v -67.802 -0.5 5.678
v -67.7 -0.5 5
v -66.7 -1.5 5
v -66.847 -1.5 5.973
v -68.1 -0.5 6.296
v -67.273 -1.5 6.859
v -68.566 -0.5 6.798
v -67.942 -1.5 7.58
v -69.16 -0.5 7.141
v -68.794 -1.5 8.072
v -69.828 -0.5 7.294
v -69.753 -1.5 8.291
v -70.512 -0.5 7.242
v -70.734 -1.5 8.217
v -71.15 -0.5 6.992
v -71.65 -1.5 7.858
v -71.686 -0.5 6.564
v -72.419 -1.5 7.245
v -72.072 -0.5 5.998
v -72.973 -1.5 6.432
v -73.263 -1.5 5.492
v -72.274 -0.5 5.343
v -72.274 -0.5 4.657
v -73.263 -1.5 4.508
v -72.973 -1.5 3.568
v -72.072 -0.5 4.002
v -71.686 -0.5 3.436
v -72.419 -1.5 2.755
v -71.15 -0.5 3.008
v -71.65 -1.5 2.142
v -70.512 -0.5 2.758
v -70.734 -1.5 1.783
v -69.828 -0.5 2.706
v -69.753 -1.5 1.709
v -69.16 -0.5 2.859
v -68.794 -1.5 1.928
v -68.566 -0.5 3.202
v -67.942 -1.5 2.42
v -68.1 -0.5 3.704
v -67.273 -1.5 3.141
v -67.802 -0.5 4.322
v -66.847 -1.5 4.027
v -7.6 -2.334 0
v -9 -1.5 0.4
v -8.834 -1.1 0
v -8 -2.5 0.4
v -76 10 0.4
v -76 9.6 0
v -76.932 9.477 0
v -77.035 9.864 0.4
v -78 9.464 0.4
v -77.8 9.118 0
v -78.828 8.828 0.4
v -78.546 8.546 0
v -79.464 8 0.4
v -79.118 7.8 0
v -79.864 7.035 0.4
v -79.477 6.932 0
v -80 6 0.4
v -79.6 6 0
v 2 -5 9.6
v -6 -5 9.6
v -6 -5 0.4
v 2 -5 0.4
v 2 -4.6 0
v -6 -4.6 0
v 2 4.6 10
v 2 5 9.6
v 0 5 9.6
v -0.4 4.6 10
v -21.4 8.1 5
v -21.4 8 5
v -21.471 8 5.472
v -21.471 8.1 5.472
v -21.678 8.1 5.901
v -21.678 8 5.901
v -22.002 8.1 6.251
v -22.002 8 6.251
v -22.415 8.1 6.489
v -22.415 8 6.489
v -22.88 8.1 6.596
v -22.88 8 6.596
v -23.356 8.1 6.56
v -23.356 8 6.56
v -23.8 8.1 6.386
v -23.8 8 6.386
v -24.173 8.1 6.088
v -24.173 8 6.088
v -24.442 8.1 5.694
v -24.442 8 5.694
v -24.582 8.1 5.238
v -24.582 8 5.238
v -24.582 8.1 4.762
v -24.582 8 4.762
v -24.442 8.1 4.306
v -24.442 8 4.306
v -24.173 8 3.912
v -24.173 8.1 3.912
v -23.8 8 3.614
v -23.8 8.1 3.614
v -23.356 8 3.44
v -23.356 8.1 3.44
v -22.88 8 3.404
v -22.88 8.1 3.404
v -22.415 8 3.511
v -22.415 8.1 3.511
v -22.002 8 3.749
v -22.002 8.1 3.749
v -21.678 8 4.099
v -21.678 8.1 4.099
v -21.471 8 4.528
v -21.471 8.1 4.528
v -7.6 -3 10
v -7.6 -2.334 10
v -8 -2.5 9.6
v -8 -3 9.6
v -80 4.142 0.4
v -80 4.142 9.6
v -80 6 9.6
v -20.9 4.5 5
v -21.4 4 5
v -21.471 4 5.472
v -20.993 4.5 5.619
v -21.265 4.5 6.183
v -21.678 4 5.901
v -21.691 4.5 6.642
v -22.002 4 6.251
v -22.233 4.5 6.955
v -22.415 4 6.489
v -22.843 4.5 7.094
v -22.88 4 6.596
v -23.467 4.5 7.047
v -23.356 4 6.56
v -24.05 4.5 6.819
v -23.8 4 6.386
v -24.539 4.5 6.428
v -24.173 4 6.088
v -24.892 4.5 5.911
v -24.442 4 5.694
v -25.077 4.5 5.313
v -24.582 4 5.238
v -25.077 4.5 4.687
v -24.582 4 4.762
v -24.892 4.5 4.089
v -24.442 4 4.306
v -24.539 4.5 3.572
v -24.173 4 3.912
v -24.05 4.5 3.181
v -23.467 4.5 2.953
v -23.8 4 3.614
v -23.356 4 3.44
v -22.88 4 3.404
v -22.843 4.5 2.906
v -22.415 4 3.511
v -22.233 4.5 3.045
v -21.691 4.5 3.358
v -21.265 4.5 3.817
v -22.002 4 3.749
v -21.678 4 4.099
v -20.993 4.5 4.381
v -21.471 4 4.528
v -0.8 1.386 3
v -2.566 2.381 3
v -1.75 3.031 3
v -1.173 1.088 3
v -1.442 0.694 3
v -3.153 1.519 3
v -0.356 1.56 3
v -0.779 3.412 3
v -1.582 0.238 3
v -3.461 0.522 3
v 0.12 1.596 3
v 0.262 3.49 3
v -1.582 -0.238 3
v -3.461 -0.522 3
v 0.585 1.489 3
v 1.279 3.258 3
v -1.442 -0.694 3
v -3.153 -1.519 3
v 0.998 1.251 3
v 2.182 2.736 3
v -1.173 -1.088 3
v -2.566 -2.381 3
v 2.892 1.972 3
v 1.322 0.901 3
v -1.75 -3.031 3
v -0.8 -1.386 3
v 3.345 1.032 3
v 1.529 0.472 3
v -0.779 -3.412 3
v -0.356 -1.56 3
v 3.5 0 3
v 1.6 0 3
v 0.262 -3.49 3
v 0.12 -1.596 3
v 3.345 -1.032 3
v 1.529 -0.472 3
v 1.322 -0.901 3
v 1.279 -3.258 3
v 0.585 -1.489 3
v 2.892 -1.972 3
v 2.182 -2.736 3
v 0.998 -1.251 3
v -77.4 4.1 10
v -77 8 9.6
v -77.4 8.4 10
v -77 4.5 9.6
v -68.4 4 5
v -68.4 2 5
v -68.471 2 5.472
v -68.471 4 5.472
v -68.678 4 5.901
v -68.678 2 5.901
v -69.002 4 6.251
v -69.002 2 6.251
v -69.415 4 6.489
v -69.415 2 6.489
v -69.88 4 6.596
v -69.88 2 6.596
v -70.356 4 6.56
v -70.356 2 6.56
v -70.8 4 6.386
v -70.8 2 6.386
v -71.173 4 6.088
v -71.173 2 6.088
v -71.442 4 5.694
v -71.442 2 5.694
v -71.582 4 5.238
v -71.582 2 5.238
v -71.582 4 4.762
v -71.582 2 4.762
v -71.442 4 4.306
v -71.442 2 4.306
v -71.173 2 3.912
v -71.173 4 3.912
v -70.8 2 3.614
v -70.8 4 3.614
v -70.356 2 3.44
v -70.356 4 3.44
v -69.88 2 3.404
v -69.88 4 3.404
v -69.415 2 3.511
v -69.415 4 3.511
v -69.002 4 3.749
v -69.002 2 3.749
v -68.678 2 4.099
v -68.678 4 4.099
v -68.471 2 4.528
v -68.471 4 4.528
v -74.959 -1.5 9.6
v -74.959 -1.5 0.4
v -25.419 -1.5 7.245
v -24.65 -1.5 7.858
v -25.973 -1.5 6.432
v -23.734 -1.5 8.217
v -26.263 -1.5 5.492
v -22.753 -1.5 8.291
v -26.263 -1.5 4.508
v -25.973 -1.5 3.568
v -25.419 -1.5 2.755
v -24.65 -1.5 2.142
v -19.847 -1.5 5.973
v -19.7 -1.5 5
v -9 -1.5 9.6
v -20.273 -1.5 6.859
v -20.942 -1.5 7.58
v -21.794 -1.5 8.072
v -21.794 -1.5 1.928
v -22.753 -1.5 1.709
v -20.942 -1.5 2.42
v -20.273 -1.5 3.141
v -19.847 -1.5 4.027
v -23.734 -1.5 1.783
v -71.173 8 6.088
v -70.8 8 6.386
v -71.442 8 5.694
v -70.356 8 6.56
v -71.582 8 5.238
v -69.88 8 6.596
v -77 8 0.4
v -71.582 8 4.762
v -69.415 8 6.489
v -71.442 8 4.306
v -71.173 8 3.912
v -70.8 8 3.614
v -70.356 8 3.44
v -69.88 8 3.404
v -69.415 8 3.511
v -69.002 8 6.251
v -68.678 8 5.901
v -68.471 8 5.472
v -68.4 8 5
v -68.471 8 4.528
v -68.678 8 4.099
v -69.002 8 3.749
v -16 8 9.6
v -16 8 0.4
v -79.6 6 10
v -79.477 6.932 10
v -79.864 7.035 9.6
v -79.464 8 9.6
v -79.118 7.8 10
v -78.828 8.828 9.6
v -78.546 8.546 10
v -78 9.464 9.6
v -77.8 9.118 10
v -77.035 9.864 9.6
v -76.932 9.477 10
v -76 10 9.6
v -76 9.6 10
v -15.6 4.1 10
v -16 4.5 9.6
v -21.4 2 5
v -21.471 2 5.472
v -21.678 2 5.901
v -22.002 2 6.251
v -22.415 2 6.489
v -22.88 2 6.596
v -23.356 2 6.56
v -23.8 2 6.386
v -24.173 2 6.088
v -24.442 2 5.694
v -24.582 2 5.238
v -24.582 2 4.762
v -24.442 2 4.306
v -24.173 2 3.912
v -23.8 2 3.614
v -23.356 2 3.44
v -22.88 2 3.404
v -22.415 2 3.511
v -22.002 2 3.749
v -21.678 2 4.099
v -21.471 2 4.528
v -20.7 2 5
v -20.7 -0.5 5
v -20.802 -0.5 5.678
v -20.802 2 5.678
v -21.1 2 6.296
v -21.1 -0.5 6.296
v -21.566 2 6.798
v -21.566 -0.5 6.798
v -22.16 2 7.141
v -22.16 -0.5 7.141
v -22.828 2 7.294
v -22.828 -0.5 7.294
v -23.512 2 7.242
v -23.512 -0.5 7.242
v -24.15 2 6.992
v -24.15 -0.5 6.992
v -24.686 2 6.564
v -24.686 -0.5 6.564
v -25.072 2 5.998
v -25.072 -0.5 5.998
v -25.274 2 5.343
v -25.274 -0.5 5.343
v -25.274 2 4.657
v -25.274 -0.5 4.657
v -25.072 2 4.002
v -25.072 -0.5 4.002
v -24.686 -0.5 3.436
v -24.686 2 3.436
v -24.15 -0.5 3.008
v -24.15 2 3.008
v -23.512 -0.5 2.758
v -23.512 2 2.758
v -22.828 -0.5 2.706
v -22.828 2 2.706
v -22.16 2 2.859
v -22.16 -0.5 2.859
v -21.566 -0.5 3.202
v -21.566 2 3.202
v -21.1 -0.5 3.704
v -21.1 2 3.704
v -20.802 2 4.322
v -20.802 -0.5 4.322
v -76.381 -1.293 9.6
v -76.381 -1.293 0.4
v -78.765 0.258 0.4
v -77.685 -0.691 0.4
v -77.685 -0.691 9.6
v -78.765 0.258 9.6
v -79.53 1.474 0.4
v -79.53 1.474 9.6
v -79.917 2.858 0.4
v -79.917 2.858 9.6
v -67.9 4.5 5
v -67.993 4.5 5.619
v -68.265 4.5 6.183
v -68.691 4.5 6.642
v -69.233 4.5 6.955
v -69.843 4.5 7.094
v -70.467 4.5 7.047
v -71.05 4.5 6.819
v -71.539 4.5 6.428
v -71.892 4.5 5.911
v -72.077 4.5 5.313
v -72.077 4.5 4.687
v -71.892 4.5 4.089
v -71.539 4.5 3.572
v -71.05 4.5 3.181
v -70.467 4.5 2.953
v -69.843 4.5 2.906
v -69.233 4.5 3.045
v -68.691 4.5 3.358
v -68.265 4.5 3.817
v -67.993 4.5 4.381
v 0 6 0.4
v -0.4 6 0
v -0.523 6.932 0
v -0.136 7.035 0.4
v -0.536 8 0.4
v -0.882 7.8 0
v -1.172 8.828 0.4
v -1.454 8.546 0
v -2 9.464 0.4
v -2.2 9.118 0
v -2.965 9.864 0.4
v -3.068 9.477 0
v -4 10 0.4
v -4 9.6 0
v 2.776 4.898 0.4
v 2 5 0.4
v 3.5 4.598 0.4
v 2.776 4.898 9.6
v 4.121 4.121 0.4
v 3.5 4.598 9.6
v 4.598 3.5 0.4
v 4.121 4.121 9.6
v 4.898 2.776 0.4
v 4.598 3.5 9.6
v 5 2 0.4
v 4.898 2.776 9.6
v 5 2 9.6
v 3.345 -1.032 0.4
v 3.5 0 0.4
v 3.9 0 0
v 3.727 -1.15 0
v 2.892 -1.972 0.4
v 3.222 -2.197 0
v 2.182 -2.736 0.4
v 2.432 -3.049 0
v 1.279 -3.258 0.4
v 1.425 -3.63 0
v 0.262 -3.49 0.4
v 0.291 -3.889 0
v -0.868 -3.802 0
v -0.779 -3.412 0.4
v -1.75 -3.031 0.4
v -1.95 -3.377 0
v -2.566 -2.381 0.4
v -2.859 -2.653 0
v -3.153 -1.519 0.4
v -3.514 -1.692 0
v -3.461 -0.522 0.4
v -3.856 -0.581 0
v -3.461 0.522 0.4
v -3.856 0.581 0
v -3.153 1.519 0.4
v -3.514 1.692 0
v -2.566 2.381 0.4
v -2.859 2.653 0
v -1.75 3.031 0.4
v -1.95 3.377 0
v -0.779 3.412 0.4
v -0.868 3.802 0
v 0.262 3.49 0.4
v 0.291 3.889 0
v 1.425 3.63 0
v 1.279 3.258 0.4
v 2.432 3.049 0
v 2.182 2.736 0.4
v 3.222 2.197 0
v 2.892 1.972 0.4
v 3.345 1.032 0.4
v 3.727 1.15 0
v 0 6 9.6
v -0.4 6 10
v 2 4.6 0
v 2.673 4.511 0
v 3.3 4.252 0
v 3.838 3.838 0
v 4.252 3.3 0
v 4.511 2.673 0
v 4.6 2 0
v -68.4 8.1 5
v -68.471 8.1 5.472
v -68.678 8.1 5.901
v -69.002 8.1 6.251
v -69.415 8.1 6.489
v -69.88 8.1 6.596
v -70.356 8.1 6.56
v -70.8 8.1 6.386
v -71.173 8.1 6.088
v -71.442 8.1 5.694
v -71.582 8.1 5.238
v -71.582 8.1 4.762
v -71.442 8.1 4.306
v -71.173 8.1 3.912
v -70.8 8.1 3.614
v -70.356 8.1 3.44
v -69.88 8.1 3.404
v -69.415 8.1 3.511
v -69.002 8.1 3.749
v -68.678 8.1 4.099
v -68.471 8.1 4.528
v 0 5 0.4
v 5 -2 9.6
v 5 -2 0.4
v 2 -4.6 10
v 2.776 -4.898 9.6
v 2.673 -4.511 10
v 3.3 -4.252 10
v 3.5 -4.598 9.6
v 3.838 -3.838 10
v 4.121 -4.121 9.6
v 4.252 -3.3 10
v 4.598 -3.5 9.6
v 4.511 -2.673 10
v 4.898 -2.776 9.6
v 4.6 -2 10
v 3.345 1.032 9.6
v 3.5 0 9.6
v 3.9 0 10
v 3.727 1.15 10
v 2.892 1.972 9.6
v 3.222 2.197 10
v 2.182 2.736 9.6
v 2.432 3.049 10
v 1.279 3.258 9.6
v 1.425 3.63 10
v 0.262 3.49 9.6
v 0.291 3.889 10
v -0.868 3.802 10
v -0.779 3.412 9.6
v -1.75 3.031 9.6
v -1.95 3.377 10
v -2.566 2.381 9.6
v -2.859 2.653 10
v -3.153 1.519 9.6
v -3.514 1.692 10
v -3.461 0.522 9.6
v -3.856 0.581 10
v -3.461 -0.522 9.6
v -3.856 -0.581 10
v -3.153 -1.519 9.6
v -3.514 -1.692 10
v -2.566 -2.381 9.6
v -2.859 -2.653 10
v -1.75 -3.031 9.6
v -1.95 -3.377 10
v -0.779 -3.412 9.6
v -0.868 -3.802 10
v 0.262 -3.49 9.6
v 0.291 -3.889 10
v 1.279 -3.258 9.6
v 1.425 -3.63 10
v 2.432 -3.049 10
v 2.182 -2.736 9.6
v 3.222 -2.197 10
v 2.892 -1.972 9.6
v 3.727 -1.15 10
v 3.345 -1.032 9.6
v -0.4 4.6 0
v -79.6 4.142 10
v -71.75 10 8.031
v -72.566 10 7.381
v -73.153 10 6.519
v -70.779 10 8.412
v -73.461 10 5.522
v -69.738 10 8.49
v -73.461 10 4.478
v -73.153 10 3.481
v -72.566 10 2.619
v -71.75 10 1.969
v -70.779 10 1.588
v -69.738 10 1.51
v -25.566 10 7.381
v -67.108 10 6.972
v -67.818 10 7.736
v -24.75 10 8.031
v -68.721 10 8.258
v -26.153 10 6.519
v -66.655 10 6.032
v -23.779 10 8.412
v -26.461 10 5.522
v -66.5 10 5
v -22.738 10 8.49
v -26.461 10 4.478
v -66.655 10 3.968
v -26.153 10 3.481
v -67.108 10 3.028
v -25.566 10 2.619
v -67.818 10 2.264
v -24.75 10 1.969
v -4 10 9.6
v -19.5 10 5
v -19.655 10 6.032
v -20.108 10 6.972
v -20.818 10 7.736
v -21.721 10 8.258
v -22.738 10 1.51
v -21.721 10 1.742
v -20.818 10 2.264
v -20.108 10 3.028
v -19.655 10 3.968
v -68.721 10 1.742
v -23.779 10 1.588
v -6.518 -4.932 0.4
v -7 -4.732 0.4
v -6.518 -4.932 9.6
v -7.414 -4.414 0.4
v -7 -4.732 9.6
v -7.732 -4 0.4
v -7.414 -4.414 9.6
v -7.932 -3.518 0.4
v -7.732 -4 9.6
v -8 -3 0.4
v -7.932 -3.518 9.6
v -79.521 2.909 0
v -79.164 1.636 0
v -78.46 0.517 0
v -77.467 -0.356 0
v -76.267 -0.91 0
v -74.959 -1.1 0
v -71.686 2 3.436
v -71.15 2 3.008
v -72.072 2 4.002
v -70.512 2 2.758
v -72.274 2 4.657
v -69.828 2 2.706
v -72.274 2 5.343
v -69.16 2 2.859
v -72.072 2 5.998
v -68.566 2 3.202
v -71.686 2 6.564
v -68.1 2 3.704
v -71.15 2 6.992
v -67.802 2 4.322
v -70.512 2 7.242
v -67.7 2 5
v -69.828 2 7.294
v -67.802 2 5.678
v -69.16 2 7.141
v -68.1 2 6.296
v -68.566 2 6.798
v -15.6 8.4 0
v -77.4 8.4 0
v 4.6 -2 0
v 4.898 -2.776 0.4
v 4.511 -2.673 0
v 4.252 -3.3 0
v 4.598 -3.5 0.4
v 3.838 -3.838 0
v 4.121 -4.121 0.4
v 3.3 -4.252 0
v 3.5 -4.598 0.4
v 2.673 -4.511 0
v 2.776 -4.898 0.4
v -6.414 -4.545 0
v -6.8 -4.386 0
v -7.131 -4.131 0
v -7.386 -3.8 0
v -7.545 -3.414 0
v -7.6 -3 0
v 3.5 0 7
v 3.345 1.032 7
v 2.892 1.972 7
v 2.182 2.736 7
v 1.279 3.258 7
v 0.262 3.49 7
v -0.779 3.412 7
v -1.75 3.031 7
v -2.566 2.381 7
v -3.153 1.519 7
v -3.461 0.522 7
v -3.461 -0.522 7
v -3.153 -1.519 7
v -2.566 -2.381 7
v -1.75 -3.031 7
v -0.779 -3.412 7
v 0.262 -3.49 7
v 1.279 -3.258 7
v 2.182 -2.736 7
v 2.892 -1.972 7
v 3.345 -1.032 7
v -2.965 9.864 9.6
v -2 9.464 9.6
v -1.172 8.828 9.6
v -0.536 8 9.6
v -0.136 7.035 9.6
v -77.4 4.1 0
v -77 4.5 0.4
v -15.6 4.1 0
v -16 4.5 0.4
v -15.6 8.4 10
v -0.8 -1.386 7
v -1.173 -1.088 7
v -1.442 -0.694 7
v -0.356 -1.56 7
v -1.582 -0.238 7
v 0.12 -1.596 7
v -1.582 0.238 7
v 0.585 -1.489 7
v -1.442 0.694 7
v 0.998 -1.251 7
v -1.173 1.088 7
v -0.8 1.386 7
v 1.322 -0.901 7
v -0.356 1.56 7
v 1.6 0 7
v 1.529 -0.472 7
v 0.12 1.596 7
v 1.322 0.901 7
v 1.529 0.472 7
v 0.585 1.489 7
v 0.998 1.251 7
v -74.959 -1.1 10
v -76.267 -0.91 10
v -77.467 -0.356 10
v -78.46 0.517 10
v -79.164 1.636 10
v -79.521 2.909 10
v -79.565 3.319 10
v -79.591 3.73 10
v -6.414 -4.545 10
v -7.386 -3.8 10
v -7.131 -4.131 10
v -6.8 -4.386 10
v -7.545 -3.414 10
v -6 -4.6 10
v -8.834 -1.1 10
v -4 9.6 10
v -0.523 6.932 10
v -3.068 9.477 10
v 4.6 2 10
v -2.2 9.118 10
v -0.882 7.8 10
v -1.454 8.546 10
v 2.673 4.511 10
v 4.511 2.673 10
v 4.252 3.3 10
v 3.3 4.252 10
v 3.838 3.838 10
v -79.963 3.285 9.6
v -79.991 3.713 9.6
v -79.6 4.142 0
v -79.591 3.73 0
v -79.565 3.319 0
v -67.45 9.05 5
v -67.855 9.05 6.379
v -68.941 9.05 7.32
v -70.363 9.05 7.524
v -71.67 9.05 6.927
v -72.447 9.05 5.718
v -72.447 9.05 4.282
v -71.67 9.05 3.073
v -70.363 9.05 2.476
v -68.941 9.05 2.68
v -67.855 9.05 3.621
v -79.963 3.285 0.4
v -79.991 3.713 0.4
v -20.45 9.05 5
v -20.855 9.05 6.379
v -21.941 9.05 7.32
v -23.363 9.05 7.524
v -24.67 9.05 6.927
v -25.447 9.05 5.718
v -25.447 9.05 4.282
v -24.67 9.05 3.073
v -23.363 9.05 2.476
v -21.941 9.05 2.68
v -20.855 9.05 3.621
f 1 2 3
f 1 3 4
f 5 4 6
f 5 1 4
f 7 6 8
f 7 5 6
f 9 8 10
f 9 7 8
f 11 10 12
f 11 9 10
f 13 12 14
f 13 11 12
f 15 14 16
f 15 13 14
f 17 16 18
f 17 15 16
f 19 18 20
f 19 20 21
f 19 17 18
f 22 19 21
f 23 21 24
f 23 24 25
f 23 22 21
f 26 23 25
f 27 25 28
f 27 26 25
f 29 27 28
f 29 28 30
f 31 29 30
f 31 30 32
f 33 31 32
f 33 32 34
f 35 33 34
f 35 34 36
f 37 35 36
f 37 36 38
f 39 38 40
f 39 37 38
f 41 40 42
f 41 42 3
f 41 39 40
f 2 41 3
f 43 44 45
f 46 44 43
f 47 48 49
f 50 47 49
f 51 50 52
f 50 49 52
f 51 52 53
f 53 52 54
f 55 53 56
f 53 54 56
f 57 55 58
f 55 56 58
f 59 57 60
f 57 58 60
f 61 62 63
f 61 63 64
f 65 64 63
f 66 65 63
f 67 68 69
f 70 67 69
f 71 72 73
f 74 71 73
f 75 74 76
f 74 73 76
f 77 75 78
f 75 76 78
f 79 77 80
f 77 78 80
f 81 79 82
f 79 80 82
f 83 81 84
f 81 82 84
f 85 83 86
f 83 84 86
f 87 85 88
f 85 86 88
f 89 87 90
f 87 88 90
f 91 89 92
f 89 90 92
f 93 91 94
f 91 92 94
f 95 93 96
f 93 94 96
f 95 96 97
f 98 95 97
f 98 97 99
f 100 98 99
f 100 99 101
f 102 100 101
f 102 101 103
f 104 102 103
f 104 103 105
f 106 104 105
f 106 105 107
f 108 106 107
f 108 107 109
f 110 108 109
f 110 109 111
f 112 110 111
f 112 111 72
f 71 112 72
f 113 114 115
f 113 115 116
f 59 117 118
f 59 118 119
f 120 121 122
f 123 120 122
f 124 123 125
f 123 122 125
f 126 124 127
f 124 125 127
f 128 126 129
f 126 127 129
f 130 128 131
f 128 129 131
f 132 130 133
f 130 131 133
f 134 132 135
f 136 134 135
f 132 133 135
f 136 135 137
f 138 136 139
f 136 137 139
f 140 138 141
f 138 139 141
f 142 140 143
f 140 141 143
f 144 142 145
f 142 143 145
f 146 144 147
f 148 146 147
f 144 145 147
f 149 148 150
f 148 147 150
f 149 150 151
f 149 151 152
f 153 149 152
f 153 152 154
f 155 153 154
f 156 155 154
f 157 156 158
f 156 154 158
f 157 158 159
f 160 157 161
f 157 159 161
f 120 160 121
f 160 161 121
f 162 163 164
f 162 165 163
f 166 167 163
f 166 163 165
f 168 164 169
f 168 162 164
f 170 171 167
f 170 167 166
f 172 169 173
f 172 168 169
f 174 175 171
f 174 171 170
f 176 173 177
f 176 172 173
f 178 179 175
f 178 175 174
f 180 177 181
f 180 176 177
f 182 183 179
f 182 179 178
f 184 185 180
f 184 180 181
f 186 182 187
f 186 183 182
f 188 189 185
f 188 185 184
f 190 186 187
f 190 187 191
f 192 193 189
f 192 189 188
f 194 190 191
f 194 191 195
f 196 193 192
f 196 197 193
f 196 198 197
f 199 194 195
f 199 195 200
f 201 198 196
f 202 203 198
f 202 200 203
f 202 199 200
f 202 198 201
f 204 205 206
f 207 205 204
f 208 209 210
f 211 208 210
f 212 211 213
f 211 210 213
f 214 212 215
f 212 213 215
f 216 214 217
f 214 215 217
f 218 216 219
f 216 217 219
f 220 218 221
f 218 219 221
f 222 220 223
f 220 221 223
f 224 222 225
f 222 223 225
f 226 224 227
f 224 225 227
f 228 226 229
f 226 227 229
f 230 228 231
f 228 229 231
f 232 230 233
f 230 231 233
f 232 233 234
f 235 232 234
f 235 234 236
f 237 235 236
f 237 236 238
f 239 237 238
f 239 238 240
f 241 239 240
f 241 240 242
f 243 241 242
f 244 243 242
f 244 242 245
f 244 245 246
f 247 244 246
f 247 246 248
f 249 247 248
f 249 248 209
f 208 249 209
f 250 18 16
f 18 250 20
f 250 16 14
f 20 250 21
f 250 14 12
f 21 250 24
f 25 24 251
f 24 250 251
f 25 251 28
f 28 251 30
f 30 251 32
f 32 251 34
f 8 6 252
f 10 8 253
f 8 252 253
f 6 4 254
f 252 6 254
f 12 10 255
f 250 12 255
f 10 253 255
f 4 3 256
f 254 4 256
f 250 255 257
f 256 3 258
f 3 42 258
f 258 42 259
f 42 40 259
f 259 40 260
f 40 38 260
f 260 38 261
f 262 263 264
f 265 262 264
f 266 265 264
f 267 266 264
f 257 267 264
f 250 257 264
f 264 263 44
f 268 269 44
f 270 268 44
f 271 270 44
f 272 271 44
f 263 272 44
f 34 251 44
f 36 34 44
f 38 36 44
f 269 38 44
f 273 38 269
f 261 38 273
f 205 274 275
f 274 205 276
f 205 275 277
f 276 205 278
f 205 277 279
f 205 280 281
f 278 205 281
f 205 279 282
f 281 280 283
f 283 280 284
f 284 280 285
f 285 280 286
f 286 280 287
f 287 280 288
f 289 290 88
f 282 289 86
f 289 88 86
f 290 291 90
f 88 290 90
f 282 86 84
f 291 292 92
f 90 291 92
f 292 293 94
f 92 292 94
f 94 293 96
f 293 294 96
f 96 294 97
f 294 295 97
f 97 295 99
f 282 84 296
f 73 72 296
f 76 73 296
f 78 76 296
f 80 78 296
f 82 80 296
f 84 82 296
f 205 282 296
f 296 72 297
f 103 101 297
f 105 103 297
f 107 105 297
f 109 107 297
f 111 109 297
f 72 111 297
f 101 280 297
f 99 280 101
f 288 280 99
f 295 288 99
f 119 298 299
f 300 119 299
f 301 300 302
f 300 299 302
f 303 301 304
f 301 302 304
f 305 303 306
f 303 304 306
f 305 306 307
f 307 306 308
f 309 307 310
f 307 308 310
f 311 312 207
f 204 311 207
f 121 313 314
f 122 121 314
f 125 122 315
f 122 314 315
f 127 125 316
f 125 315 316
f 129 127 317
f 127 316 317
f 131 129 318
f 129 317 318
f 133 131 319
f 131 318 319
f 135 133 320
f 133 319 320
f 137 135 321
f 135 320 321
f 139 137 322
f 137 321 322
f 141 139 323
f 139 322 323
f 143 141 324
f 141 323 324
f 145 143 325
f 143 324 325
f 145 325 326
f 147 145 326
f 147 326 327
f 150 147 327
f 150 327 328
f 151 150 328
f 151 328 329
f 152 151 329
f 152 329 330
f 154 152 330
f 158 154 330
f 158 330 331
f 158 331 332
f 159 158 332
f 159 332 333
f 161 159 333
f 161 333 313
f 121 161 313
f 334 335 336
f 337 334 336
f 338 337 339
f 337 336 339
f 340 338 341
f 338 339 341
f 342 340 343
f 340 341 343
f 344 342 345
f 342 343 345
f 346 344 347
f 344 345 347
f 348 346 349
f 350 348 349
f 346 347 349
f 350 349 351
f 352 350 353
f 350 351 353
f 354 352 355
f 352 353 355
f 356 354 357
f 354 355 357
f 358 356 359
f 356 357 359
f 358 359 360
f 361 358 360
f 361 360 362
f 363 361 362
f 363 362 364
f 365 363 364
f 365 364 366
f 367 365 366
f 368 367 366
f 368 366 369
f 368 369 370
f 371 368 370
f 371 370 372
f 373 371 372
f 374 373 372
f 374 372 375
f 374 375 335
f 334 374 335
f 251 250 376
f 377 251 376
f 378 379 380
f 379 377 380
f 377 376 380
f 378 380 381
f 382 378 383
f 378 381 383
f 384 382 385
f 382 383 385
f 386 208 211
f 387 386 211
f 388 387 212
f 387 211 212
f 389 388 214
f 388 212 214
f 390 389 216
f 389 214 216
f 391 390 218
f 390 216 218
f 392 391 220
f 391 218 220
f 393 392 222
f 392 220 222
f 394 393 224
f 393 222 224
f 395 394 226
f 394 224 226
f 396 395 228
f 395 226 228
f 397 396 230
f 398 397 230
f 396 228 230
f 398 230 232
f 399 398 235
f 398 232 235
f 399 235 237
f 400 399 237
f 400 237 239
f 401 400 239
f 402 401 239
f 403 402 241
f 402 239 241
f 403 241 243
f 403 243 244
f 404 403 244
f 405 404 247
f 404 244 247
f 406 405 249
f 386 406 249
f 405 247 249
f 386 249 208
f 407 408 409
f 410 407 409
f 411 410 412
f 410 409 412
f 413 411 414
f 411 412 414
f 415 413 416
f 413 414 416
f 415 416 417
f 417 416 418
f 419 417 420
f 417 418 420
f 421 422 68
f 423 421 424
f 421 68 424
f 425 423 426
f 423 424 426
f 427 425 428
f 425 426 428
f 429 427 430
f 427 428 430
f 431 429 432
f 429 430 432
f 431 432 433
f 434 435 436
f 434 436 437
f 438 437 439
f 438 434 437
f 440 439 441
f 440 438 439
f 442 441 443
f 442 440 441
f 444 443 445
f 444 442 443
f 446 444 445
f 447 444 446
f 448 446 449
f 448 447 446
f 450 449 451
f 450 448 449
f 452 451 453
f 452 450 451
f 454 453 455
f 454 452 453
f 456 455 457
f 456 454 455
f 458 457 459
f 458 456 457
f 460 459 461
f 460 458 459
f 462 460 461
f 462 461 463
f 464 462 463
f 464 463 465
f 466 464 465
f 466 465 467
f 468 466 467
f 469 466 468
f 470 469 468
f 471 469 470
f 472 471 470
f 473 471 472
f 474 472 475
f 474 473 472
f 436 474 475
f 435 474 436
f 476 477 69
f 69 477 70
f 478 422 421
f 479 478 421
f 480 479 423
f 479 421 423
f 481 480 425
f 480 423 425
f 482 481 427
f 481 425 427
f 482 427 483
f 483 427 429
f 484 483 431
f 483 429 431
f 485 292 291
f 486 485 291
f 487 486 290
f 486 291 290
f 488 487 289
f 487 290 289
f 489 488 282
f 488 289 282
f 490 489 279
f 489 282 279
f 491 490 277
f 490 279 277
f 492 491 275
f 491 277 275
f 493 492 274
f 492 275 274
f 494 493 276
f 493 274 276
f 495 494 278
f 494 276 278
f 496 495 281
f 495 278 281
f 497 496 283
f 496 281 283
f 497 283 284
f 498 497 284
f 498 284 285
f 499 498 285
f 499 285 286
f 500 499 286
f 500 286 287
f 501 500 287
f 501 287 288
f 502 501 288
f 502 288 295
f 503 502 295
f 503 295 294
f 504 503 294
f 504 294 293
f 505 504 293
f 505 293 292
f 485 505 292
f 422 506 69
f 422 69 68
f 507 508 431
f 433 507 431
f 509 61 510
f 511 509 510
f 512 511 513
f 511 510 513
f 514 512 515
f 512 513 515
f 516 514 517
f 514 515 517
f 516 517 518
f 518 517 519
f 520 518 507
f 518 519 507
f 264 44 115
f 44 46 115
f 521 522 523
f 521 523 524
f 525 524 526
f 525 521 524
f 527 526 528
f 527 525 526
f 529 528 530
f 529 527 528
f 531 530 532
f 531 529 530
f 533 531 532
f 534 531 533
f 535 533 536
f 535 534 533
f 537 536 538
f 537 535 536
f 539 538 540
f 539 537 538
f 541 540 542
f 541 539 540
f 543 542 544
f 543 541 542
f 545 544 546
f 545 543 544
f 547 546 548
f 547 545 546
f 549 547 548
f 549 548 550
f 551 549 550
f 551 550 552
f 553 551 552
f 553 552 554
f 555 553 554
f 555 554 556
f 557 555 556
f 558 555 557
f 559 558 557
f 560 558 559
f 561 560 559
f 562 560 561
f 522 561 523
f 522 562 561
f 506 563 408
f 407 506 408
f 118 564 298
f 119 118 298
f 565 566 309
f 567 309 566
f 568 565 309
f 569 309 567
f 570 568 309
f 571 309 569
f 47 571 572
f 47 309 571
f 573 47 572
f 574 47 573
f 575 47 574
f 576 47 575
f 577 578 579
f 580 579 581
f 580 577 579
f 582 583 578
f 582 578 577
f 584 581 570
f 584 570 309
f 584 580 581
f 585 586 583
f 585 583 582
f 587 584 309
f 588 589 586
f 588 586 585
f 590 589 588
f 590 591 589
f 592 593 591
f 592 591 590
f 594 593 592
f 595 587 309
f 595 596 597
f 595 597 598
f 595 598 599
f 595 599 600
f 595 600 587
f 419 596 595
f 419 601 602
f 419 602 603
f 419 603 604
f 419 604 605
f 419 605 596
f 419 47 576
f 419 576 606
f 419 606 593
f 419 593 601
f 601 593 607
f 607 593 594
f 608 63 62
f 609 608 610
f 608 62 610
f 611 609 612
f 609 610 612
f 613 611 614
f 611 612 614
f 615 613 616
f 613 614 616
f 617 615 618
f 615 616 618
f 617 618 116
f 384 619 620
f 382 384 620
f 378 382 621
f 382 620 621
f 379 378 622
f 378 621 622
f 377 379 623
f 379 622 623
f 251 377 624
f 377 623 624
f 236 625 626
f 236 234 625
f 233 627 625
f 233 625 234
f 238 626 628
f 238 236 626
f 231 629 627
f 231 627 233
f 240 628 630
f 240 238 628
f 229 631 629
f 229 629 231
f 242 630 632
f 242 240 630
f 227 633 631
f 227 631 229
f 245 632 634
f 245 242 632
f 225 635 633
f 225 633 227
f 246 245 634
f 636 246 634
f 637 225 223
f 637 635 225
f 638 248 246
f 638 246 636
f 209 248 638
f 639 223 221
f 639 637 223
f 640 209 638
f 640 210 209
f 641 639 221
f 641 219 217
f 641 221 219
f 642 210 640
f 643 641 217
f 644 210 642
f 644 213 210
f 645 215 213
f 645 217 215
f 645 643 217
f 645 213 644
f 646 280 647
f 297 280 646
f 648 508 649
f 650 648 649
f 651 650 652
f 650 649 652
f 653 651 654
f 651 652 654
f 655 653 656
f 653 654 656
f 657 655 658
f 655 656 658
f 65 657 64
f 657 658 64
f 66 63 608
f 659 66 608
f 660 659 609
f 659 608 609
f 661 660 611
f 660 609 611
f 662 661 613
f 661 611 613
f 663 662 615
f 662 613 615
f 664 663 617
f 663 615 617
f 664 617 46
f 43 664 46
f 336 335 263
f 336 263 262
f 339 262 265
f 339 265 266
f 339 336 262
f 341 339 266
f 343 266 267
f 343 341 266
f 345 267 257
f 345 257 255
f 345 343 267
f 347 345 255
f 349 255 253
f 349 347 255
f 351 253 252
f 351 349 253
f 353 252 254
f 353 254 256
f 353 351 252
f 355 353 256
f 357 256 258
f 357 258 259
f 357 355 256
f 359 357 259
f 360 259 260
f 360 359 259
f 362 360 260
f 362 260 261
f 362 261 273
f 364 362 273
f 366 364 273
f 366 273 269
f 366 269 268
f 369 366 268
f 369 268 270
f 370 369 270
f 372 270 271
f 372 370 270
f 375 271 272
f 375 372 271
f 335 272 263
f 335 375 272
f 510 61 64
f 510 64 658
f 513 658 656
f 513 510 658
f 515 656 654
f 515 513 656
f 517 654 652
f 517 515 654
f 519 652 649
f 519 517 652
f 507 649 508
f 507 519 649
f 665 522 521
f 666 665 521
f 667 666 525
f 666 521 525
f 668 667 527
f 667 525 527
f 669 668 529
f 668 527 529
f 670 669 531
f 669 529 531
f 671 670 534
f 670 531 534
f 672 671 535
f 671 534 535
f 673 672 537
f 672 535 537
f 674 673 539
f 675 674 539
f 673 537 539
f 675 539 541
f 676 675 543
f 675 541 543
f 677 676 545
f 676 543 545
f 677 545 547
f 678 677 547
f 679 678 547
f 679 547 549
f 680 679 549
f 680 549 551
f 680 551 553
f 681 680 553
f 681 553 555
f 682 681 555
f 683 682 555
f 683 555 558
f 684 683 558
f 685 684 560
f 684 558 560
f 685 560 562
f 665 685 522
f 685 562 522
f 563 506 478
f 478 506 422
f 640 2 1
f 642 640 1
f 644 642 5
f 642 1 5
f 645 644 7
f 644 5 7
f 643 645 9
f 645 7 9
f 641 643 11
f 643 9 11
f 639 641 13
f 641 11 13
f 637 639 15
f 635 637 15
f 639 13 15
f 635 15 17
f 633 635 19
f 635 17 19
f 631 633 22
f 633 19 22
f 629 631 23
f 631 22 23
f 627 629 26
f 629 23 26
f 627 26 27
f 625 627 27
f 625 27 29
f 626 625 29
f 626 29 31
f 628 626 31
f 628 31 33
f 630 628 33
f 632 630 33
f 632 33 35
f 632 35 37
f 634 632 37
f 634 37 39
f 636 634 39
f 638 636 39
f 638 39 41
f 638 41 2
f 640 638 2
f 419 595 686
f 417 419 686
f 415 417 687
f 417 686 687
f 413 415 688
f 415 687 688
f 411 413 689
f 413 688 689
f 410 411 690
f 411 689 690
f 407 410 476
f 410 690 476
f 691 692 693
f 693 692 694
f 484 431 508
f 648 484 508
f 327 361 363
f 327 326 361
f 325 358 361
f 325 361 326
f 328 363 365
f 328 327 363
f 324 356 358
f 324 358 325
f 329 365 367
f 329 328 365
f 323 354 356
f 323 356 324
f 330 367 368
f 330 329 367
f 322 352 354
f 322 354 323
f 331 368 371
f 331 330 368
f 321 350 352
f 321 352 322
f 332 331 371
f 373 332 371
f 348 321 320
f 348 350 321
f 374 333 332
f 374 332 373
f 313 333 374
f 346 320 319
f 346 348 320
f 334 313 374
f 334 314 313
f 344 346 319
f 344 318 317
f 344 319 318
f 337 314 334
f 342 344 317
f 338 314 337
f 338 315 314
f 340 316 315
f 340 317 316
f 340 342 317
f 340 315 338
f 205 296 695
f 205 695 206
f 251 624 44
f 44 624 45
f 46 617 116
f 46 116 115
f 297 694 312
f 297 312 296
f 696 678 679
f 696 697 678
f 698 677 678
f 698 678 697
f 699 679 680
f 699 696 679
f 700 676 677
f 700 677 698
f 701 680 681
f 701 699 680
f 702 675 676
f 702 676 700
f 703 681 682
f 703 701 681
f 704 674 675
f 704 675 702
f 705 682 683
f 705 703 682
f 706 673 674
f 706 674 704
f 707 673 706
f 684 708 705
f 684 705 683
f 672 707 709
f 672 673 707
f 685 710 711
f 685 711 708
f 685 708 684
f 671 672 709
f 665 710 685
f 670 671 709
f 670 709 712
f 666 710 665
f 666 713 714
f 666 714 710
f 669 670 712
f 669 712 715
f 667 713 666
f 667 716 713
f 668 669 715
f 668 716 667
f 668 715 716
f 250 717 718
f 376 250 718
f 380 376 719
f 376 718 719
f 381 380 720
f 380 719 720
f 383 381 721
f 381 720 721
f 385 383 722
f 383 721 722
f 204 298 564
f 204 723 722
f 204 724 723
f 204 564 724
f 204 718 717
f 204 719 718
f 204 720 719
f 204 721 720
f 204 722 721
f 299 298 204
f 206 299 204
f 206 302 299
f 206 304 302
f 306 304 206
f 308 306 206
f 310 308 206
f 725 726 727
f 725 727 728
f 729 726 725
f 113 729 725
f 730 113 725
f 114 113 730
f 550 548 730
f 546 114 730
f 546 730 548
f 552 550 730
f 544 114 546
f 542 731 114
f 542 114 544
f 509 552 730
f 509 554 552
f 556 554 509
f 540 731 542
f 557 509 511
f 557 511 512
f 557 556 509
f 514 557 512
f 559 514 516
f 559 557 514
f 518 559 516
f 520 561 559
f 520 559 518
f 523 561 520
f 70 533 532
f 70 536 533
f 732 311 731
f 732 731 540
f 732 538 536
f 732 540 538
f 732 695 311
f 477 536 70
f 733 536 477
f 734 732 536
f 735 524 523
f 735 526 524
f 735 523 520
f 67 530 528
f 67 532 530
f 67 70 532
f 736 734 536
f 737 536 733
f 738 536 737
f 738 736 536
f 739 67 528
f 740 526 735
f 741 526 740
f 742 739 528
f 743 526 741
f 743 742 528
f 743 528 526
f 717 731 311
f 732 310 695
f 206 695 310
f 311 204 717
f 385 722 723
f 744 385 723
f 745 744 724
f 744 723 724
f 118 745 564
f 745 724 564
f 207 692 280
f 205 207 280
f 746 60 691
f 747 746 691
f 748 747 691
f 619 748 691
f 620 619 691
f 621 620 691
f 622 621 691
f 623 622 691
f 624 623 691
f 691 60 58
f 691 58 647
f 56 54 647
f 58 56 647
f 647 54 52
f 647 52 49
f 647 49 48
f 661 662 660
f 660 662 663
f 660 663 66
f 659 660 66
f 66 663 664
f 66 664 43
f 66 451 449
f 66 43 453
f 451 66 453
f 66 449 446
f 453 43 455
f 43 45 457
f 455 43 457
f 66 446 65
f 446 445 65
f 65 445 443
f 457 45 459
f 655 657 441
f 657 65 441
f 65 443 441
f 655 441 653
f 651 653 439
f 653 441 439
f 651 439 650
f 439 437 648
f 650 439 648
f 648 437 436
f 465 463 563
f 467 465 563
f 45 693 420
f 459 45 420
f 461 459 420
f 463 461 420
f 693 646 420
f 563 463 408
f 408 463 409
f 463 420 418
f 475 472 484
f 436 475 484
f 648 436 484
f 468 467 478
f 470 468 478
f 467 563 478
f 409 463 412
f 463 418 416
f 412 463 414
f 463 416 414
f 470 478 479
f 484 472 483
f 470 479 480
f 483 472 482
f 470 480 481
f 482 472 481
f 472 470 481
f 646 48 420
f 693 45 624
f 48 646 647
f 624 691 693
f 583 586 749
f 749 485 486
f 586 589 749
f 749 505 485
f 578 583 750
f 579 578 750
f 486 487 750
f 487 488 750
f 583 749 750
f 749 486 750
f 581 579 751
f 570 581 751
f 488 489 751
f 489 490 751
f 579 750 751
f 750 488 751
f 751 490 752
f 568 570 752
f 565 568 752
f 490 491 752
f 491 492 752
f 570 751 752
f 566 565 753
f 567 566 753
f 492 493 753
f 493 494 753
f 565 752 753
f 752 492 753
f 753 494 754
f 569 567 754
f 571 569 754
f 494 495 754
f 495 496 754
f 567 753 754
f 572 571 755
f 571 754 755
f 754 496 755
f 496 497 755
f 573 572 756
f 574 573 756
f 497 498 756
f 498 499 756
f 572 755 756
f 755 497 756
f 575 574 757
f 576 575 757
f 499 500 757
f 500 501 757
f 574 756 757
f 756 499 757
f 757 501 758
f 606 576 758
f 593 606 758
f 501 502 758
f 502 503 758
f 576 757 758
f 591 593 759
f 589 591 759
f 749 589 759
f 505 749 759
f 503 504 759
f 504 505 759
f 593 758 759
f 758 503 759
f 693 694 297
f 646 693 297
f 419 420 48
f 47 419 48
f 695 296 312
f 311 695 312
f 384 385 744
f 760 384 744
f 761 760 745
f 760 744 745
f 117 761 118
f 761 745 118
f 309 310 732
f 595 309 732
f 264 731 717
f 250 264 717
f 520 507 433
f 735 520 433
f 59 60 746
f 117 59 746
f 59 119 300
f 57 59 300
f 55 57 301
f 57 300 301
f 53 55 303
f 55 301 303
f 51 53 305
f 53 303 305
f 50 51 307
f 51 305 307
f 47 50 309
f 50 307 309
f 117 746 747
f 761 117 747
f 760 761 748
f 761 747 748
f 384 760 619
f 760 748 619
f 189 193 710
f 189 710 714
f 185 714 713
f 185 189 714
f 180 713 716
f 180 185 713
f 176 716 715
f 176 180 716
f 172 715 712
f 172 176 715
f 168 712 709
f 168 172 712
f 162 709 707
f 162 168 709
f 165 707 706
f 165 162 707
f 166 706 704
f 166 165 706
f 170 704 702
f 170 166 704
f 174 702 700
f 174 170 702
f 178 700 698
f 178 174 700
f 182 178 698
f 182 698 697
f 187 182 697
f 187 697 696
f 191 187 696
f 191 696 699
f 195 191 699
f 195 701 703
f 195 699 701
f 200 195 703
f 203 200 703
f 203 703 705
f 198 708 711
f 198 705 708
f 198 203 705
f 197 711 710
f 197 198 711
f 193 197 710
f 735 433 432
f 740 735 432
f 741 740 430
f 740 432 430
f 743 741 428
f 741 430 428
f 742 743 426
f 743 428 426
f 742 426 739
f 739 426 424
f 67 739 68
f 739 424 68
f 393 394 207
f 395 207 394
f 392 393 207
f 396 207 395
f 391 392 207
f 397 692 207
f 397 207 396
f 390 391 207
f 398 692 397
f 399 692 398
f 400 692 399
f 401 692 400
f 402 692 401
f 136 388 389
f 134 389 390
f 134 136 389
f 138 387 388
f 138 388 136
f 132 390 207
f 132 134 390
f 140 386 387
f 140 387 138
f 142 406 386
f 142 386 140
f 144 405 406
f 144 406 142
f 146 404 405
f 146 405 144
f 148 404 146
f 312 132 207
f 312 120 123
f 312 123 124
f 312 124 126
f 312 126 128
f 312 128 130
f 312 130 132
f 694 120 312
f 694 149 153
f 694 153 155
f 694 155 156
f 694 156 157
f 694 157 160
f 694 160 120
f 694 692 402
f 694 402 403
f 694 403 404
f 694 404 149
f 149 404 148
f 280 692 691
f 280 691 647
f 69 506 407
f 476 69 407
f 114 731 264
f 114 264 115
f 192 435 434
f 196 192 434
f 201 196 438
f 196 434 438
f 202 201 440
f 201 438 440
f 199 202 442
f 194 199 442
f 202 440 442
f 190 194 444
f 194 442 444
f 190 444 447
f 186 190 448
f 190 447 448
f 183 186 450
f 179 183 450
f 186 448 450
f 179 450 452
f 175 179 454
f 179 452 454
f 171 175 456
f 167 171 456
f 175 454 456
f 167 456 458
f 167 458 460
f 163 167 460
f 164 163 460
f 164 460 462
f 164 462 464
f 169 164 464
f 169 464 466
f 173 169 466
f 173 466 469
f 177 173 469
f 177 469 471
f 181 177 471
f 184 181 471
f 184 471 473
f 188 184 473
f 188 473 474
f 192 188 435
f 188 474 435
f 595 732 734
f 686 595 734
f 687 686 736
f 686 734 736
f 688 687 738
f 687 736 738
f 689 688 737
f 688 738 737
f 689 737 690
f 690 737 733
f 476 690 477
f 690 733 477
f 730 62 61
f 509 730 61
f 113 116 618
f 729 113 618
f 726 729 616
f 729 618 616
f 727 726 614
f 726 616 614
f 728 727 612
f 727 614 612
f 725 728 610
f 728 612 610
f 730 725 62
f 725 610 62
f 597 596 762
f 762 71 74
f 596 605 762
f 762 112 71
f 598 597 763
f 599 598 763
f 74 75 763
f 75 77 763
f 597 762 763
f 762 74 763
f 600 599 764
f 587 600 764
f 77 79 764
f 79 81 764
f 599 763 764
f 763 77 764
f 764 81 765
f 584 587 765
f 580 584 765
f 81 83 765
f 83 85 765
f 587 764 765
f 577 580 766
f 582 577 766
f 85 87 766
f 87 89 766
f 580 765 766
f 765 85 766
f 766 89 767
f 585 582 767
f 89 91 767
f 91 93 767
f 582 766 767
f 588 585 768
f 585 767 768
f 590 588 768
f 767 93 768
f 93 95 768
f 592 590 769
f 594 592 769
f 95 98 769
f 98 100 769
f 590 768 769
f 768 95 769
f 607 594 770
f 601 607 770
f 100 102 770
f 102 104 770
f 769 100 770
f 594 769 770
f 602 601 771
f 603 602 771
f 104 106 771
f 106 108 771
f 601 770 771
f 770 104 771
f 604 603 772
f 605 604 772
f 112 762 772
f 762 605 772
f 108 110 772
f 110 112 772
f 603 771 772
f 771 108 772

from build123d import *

# Parameters (mm, degrees)
SKETCH058_W          = 85
SKETCH058_H          = 10
SKETCH058_R          = 1.6
PAD030_DEPTH         = 10
FILLET019_R          = 3
SKETCH059_W          = 80
SKETCH059_H          = 5
PAD031_DEPTH         = 10
SKETCH060_W          = 61
SKETCH060_H          = 3.5
POCKET027_DEPTH      = 10.001
FILLET020_R          = 4
CHAMFER014_SIZE      = 5
SKETCH061_R          = 1.6
POCKET028_DEPTH      = 10.001
POCKET028_DEPTH_BACK = 5.001
CHAMFER015_SIZE      = 1.9
SKETCH062_R          = 2.3
POCKET029_DEPTH      = 7
CHAMFER016_SIZE      = 1
FILLET021_R          = 10
FILLET022_R          = 3
CHAMFER017_SIZE      = 0.5
SKETCH063_R          = 3.5
POCKET030_DEPTH      = 3
SKETCH064_R          = 3.5
POCKET031_DEPTH      = 3
SKETCH065_W          = 72
SKETCH065_H          = 3.5
POCKET032_DEPTH      = 10.001
FILLET023_R          = 2
FILLET024_R          = 5
CHAMFER018_SIZE      = 1
CHAMFER019_SIZE      = 1
CHAMFER020_SIZE      = 0.4


with BuildPart() as part:
    # Sketch058 → Pad030 (new body)
    with BuildSketch(Plane.XY):
        with Locations((-37.5, 0)):
            Rectangle(SKETCH058_W, SKETCH058_H)
        Circle(SKETCH058_R, mode=Mode.SUBTRACT)
    extrude(amount=PAD030_DEPTH)

    # Fillet019
    fillet019_edges = [part.edges().sort_by_distance(p)[0] for p in [
        (5, 5, 5),
        (5, -5, 5),
    ]]
    fillet(fillet019_edges, radius=FILLET019_R)

    # Sketch059 → Pad031 (join)
    with BuildSketch(Plane.XY):
        with Locations((-40, 7.5)):
            Rectangle(SKETCH059_W, SKETCH059_H)
    extrude(amount=PAD031_DEPTH)

    # Sketch060 → Pocket027 (cut, through all)
    with BuildSketch(Plane.XY):
        with Locations((-46.5, 6.25)):
            Rectangle(SKETCH060_W, SKETCH060_H)
    extrude(amount=POCKET027_DEPTH, mode=Mode.SUBTRACT)

    # Fillet020
    fillet020_edges = [part.edges().sort_by_distance(p)[0] for p in [
        (0, 10, 5),
        (-80, 10, 5),
    ]]
    fillet(fillet020_edges, radius=FILLET020_R)

    # Chamfer014
    chamfer014_edges = [part.edges().sort_by_distance(p)[0] for p in [
        (-80, -5, 5),
    ]]
    chamfer(chamfer014_edges, length=CHAMFER014_SIZE)

    # Sketch061 → Pocket028 (cut, two sides)
    with BuildSketch(Plane.XZ) as pocket028_sk:
        with Locations((-23, 5)):
            Circle(SKETCH061_R)
        with Locations((-70, 5)):
            Circle(SKETCH061_R)
    extrude(amount=-POCKET028_DEPTH, mode=Mode.SUBTRACT)
    extrude(pocket028_sk.sketch, amount=POCKET028_DEPTH_BACK, mode=Mode.SUBTRACT)

    # Chamfer015
    chamfer015_edges = [part.edges().sort_by_distance(p)[0] for p in [
        (-71.6, 10, 5),
        (-24.6, 10, 5),
    ]]
    chamfer(chamfer015_edges, length=CHAMFER015_SIZE)

    # Sketch062 (on Face11 of Chamfer015) → Pocket029 (cut)
    with BuildSketch(Plane.XZ.offset(5)):
        with Locations((-70, 5)):
            Circle(SKETCH062_R)
        with Locations((-23, 5)):
            Circle(SKETCH062_R)
    extrude(amount=-POCKET029_DEPTH, mode=Mode.SUBTRACT)

    # Chamfer016
    chamfer016_edges = [part.edges().sort_by_distance(p)[0] for p in [
        (-72.3, -5, 5),
        (-25.3, -5, 5),
    ]]
    chamfer(chamfer016_edges, length=CHAMFER016_SIZE)

    # Fillet021
    fillet021_edges = [part.edges().sort_by_distance(p)[0] for p in [
        (-80, 0, 5),
    ]]
    fillet(fillet021_edges, radius=FILLET021_R)

    # Fillet022
    fillet022_edges = [part.edges().sort_by_distance(p)[0] for p in [
        (-75, -5, 5),
    ]]
    fillet(fillet022_edges, radius=FILLET022_R)

    # Chamfer017
    chamfer017_edges = [part.edges().sort_by_distance(p)[0] for p in [
        (-71.6, 4.5, 5),
        (-24.6, 4.5, 5),
    ]]
    chamfer(chamfer017_edges, length=CHAMFER017_SIZE)

    # Sketch063 (on Face6 of Chamfer017) → Pocket030 (cut)
    with BuildSketch(Plane.XY.offset(10)):
        Circle(SKETCH063_R)
    extrude(amount=-POCKET030_DEPTH, mode=Mode.SUBTRACT)

    # Sketch064 (on Face3 of Pocket030) → Pocket031 (cut)
    with BuildSketch(Plane(origin=(0, 0, 0), x_dir=(1, 0, 0), z_dir=(0, 0, -1))):
        Circle(SKETCH064_R)
    extrude(amount=-POCKET031_DEPTH, mode=Mode.SUBTRACT)

    # Sketch065 → Pocket032 (cut, through all)
    with BuildSketch(Plane.XY):
        with Locations((-44, -3.25)):
            Rectangle(SKETCH065_W, SKETCH065_H)
    extrude(amount=POCKET032_DEPTH, mode=Mode.SUBTRACT)

    # Fillet023
    fillet023_edges = [part.edges().sort_by_distance(p)[0] for p in [
        (-8, -5, 5),
    ]]
    fillet(fillet023_edges, radius=FILLET023_R)

    # Fillet024
    fillet024_edges = [part.edges().sort_by_distance(p)[0] for p in [
        (-78.256289, -1.5, 5),
    ]]
    fillet(fillet024_edges, radius=FILLET024_R)

    # Chamfer018
    chamfer018_edges = [part.edges().sort_by_distance(p)[0] for p in [
        (-8, -1.5, 5),
    ]]
    chamfer(chamfer018_edges, length=CHAMFER018_SIZE)

    # Chamfer019
    chamfer019_edges = [part.edges().sort_by_distance(p)[0] for p in [
        (-72.3, -1.5, 5),
        (-25.3, -1.5, 5),
    ]]
    chamfer(chamfer019_edges, length=CHAMFER019_SIZE)

    # Chamfer020
    chamfer020_edges = [part.edges().sort_by_distance(p)[0] for p in [
        (-41.979297, -1.5, 10),
        (-8.5, -2, 10),
        (-78.259301, -0.255708, 10),
        (-8, -2.75, 10),
        (-79.979276, 3.498666, 10),
        (-7.414214, -4.414214, 10),
        (-80, 5.071068, 10),
        (-2, -5, 10),
        (-78.828427, 8.828427, 10),
        (4.12132, -4.12132, 10),
        (-40, 10, 10),
        (5, 0, 10),
        (-1.171573, 8.828427, 10),
        (4.12132, 4.12132, 10),
        (0, 5.5, 10),
        (1, 5, 10),
        (-3.5, 0, 10),
        (-46.5, 8, 10),
        (-16, 6.25, 10),
        (-77, 6.25, 10),
        (-46.5, 4.5, 10),
        (-41.979297, -1.5, 0),
        (-8.5, -2, 0),
        (-78.259301, -0.255708, 0),
        (-8, -2.75, 0),
        (-79.979276, 3.498666, 0),
        (-7.414214, -4.414214, 0),
        (-80, 5.071068, 0),
        (-2, -5, 0),
        (-78.828427, 8.828427, 0),
        (4.12132, -4.12132, 0),
        (-40, 10, 0),
        (5, 0, 0),
        (-1.171573, 8.828427, 0),
        (4.12132, 4.12132, 0),
        (0, 5.5, 0),
        (1, 5, 0),
        (-3.5, 0, 0),
        (-46.5, 8, 0),
        (-77, 6.25, 0),
        (-16, 6.25, 0),
        (-46.5, 4.5, 0),
    ]]
    chamfer(chamfer020_edges, length=CHAMFER020_SIZE)


solid = part.part
